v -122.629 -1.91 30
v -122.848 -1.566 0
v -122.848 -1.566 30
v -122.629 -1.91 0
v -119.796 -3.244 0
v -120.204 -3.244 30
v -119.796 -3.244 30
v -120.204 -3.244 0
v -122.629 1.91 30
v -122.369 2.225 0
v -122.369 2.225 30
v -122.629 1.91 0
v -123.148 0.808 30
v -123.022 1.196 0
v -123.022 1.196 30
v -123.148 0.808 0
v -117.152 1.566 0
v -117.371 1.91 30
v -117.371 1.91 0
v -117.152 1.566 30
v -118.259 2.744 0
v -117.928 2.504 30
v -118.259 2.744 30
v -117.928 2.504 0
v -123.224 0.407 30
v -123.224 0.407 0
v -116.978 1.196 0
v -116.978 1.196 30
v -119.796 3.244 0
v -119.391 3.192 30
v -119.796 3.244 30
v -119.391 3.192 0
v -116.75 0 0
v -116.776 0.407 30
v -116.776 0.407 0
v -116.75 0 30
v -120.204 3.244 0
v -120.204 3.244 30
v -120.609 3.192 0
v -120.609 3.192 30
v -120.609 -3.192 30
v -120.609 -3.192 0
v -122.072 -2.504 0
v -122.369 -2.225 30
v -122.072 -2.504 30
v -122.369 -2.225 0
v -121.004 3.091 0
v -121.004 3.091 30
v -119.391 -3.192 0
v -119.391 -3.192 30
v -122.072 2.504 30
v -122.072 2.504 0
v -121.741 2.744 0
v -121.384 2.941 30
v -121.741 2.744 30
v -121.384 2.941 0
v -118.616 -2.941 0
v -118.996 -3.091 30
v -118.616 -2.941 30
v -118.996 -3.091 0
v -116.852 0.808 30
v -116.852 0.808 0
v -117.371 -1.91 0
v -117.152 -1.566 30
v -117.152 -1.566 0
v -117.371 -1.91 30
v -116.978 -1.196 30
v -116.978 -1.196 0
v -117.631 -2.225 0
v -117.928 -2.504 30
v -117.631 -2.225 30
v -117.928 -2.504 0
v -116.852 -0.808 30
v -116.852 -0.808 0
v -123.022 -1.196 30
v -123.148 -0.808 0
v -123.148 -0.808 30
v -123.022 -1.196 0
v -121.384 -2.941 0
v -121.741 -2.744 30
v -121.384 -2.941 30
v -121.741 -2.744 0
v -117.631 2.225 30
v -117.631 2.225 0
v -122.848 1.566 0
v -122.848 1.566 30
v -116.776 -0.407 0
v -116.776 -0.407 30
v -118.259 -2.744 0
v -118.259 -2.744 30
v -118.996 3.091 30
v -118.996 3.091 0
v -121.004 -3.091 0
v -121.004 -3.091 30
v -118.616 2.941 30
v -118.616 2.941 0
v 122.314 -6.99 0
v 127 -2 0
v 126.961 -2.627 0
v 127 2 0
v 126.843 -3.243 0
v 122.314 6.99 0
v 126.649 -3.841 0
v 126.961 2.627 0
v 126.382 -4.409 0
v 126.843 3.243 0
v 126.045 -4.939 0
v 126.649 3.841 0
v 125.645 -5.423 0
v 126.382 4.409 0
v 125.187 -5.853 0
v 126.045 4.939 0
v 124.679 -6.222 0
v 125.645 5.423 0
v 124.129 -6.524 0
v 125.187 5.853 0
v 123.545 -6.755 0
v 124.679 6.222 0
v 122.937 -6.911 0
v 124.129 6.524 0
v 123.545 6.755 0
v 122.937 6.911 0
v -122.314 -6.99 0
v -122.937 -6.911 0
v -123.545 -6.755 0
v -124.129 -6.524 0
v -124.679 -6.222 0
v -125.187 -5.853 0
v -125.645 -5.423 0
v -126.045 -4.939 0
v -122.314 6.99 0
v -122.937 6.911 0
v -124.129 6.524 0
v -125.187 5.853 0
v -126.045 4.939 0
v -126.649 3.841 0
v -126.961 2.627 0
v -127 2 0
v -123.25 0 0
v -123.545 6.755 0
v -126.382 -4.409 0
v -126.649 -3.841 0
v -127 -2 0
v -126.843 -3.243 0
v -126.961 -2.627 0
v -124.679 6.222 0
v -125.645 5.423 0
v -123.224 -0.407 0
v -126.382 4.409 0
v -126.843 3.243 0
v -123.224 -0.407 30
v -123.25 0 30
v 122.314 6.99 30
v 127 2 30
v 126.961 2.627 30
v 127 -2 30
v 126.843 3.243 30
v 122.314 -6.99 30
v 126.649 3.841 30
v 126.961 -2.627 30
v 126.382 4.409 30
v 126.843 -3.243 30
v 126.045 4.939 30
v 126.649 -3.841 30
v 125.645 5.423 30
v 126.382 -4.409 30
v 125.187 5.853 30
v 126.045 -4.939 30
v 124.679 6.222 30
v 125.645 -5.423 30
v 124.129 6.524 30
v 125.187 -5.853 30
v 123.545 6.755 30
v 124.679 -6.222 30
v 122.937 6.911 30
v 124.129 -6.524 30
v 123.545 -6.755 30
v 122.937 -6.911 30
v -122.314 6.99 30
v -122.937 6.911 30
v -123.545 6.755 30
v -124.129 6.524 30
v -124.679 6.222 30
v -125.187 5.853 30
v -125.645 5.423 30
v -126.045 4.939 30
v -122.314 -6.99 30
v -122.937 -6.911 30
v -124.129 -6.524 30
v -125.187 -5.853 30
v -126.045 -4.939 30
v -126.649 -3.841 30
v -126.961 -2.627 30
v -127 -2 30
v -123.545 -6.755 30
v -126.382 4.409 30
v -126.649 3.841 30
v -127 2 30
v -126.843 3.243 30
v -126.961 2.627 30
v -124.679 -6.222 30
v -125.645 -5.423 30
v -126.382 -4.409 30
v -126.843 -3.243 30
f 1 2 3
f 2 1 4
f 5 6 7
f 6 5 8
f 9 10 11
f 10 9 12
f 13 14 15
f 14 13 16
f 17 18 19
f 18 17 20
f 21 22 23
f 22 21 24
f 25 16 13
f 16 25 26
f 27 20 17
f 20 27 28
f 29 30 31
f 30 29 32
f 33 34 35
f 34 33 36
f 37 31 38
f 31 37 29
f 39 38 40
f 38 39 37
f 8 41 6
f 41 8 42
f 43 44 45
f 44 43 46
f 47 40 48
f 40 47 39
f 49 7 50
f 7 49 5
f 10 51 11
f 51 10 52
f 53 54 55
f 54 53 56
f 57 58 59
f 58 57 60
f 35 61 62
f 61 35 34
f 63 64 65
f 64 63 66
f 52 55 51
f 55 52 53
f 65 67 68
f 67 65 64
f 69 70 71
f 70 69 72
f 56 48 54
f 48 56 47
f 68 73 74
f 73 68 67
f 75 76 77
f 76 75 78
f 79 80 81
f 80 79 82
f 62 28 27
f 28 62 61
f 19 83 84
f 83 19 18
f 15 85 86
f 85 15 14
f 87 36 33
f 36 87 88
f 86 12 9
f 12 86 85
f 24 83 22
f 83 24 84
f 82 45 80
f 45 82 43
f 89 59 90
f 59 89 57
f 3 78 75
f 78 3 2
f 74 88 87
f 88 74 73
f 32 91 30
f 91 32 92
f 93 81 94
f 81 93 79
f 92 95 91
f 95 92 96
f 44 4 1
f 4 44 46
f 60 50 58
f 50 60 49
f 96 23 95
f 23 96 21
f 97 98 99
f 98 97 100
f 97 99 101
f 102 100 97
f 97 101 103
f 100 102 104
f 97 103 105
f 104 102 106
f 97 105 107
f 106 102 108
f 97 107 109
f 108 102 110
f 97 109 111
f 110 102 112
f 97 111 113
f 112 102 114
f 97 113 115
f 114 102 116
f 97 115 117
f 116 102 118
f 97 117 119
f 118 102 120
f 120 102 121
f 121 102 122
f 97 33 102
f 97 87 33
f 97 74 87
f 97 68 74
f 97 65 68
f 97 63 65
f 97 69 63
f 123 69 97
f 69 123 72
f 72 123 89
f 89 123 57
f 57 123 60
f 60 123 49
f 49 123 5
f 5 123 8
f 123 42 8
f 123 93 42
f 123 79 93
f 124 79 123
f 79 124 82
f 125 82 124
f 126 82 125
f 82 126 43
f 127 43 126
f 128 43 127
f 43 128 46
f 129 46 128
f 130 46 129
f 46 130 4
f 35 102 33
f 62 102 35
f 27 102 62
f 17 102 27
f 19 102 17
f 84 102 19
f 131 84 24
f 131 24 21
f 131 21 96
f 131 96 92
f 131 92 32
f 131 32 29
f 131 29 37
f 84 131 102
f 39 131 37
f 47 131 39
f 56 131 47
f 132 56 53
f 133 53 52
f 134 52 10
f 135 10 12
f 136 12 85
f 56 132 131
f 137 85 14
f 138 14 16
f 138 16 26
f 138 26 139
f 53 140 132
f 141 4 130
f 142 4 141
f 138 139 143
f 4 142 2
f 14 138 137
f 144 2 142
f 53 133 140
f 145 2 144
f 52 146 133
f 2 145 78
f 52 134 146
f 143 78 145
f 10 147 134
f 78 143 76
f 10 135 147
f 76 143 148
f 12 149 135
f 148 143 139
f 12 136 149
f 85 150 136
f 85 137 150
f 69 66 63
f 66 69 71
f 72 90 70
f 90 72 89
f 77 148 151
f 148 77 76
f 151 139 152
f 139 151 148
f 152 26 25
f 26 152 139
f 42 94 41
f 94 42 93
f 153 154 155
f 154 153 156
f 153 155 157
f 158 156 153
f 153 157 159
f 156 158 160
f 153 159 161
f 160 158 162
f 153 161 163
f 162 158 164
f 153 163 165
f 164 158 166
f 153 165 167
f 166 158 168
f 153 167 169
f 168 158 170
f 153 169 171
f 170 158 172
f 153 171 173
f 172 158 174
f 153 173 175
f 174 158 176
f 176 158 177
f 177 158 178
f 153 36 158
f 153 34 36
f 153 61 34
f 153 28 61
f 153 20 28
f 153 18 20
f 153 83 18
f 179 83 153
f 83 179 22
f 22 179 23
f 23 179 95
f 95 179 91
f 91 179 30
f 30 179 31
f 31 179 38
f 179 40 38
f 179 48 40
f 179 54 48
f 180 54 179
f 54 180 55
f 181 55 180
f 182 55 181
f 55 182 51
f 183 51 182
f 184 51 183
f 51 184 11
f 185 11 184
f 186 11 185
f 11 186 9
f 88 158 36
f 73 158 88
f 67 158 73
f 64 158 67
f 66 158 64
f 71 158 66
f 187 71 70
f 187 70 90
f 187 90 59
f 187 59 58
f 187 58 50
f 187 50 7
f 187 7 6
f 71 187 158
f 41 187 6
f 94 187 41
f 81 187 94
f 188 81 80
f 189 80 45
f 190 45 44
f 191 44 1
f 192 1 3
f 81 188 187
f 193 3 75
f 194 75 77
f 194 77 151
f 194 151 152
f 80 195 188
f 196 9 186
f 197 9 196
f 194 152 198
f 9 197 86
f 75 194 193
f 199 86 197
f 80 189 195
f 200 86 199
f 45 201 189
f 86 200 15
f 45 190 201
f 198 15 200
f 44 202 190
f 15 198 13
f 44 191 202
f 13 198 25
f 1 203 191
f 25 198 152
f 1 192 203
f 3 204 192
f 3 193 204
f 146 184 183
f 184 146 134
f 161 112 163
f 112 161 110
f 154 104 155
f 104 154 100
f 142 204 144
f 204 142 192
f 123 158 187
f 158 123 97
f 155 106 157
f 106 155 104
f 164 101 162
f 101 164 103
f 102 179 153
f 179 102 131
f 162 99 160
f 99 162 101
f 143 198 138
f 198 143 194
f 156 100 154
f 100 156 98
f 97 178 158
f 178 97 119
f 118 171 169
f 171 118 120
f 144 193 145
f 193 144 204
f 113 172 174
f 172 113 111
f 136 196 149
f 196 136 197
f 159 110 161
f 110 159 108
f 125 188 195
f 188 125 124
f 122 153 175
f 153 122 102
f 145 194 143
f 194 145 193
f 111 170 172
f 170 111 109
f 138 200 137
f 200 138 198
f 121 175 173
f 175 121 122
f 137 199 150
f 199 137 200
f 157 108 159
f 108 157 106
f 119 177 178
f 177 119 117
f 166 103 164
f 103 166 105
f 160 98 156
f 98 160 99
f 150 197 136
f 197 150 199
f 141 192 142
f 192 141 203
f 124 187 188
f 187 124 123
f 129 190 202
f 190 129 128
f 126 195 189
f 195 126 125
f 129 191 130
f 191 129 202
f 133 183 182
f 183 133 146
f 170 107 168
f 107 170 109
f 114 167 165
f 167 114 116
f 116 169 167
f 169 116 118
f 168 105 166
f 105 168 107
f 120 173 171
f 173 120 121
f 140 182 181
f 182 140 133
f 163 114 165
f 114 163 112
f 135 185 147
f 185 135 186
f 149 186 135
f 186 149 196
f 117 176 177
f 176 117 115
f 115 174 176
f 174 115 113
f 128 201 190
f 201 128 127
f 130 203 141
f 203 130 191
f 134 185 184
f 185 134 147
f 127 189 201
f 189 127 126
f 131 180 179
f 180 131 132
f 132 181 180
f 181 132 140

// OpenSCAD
$fn = 50;


difference() {
	union() {
		hull() {
			translate(v = [-122.0000000000, 2.0000000000, 0]) {
				cylinder(h = 30, r = 5);
			}
			translate(v = [122.0000000000, 2.0000000000, 0]) {
				cylinder(h = 30, r = 5);
			}
			translate(v = [-122.0000000000, -2.0000000000, 0]) {
				cylinder(h = 30, r = 5);
			}
			translate(v = [122.0000000000, -2.0000000000, 0]) {
				cylinder(h = 30, r = 5);
			}
		}
	}
	union() {
		translate(v = [-120.0000000000, 0.0000000000, 0]) {
			cylinder(h = 30, r = 3.2500000000);
		}
		translate(v = [-120.0000000000, 0.0000000000, 0]) {
			cylinder(h = 30, r = 1.8000000000);
		}
		translate(v = [-120.0000000000, 0.0000000000, 0]) {
			cylinder(h = 30, r = 1.8000000000);
		}
		translate(v = [-120.0000000000, 0.0000000000, 0]) {
			cylinder(h = 30, r = 1.8000000000);
		}
	}
}
